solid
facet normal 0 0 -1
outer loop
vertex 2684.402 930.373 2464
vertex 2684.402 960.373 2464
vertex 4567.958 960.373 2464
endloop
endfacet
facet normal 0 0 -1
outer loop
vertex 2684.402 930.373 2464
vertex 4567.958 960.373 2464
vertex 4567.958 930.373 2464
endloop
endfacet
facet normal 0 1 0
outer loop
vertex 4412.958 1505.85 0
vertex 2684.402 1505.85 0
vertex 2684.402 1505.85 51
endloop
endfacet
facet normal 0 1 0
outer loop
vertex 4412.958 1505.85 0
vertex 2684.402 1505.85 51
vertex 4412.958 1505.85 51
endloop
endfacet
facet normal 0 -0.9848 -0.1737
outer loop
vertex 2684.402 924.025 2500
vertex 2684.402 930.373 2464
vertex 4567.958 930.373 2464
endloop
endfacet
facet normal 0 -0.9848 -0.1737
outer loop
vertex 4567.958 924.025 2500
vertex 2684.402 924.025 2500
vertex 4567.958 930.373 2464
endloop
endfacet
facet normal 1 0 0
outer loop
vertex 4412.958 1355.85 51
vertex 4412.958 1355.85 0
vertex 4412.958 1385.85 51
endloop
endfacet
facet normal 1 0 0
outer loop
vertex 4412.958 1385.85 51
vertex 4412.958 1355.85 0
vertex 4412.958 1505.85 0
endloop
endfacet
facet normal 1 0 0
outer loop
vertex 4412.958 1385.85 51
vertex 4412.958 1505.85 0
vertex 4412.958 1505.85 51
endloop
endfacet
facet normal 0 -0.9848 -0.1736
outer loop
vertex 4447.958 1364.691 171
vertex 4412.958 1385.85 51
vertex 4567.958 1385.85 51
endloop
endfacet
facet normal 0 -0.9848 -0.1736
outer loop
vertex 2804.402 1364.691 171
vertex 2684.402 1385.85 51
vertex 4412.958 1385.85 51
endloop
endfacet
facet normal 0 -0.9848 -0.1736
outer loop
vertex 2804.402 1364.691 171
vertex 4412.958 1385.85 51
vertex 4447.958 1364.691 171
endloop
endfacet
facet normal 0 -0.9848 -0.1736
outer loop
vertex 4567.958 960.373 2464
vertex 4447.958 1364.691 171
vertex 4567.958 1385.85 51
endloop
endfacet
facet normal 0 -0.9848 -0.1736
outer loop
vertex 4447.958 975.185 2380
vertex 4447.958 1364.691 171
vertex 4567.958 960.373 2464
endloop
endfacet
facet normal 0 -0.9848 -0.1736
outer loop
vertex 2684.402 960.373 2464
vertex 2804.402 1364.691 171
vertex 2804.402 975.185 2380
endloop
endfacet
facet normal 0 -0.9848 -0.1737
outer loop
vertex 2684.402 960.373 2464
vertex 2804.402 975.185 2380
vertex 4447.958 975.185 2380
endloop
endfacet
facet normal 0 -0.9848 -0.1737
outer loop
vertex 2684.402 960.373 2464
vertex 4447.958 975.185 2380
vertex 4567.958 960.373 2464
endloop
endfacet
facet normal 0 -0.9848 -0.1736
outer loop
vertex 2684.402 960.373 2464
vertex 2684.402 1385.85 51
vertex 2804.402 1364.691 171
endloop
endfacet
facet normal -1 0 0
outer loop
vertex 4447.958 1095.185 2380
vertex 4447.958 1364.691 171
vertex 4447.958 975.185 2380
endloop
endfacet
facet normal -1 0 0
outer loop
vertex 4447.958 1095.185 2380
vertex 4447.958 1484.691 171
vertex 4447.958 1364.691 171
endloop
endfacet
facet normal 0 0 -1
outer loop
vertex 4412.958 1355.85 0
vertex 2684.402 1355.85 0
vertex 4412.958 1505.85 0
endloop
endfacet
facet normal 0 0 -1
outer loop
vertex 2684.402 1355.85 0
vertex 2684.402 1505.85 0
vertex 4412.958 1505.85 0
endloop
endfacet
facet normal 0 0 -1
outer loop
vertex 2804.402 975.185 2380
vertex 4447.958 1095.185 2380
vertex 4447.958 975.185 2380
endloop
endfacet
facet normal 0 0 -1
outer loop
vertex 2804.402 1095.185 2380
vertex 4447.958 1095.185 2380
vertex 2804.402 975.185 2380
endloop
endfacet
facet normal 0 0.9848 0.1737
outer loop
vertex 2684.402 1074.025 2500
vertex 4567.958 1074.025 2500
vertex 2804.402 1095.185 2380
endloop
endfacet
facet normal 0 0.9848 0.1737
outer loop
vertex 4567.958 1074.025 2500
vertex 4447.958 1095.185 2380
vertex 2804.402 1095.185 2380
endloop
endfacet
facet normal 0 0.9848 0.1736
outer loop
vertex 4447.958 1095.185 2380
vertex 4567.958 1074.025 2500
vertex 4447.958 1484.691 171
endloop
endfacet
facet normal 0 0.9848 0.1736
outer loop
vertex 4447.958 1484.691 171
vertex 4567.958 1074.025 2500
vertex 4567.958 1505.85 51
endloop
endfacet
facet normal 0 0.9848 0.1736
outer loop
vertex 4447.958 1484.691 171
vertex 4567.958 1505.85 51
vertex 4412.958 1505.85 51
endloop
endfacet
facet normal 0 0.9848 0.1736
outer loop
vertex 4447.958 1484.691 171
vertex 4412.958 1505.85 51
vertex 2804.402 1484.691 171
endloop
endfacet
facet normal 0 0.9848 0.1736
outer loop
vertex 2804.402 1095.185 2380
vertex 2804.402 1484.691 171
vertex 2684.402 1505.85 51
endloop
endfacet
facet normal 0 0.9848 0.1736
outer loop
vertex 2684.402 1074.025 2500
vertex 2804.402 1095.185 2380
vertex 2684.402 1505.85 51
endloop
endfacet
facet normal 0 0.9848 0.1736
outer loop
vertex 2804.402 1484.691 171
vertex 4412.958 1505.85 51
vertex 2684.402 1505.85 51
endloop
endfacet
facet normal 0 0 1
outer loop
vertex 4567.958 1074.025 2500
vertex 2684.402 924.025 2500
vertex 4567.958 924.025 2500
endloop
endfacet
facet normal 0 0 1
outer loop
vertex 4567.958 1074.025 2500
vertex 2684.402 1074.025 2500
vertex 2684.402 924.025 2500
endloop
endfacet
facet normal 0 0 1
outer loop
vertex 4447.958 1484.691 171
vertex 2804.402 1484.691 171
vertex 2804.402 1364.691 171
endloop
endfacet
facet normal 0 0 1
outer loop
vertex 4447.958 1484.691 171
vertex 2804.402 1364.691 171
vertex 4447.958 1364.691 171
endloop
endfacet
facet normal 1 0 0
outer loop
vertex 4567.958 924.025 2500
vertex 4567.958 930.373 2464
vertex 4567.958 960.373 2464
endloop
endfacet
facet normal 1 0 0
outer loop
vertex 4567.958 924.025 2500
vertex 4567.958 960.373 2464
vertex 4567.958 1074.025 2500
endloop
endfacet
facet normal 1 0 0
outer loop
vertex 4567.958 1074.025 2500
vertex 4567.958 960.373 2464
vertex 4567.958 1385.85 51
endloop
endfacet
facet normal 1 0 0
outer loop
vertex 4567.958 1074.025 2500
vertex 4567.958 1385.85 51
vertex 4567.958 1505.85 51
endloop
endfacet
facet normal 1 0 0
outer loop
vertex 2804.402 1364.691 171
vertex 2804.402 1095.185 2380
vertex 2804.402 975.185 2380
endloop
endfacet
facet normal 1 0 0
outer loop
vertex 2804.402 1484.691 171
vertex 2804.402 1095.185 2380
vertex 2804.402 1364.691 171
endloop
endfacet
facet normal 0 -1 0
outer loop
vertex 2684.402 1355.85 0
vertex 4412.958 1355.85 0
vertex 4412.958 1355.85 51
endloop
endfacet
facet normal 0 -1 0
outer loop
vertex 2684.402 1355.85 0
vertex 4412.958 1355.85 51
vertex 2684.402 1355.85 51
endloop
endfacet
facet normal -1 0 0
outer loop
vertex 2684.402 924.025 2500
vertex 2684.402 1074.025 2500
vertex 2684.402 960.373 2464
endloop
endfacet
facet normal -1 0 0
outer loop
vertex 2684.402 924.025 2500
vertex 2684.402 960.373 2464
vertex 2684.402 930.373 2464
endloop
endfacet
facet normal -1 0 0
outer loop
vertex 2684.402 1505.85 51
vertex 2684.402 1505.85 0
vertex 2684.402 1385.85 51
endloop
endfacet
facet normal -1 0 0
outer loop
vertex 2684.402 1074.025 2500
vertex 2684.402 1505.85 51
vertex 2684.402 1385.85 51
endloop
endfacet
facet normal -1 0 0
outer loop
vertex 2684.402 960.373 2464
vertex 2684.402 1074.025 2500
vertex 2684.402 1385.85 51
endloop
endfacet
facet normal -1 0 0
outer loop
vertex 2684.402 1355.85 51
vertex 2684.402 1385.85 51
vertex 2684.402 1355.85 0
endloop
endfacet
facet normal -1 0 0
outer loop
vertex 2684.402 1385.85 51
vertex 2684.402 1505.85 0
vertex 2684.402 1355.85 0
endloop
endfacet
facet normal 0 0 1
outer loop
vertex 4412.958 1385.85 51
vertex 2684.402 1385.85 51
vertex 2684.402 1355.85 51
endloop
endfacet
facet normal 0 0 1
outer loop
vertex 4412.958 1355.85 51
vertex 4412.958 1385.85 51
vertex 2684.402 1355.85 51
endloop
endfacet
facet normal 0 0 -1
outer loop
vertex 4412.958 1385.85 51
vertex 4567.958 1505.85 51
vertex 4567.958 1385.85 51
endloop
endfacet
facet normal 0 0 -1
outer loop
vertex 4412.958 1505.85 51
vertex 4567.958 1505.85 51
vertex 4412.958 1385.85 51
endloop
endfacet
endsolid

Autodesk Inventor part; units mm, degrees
sketch "Sketch2" plane through (0, 0, 0) normal (0, 0, 1) x (1, 0, 0)
  line L0 (-4731.265, 1505.8501) -> (4722.9578, 1505.8501)
  line L1 (2684.4021, 1074.0253) -> (2684.4021, 1505.8501)
  line L2 (4412.9578, -1494.1499) -> (4412.9578, 1505.8501)
  line L3 (4722.9578, -1494.1499) -> (4722.9578, 1505.8501)
  line L4 (4412.9578, 1505.8501) -> (4722.9578, 1505.8501)
  line L5 (4567.9578, 1505.8501) -> (4567.9578, 1355.8501)
  line L6 (4567.9578, 1355.8501) -> (2684.4021, 1355.8501)
  point P0 (0, 0)
  dimension "d0" = 150
ref_plane "Work Plane2" through (0, 0, 2500) normal (0, 0, 1) x (1, 0, 0)
ref_plane "Work Plane1" through (0, 0, 0) normal (0, 0, 1) x (1, 0, 0)
sketch "Sketch3" plane through (0, 0, 2500) normal (0, 0, 1) x (1, 0, 0)
  line L0 (2684.4021, 1074.0253) -> (2684.4021, 1505.8501) projected
  point P0 (0, 0)
extrude "Extrusion1" add sketch "Sketch2" along normal blind 51
ref_plane "Work Plane3" through (4722.9578, 1505.8501, 51) normal (0, 0, 1) x (-1, 0, 0)
sketch "Sketch4" plane through (4722.9578, 1505.8501, 51) normal (0, 0, 1) x (-1, 0, 0)
  line L0 (155, 150) -> (155, 0) projected
  line L1 (155, 0) -> (2038.5557, 0) projected
  line L2 (2038.5557, 0) -> (2038.5557, 150) projected
  line L3 (2038.5557, 150) -> (155, 150) projected
  line L4 (2038.5557, 150) -> (155, 150) projected
  line L5 (2038.5557, 0) -> (155, 0)
  line L6 (155, 0) -> (155, 150)
  line L7 (155, 150) -> (2038.5557, 150)
  line L8 (2038.5557, 150) -> (2038.5557, 0)
  point P0 (4722.9578, 1505.8501)
ref_plane "Work Plane4" through (2684.4021, 1505.8501, 51) normal (-1, 0, 0) x (0, -1, 0)
sketch "Sketch5" plane through (2684.4021, 1505.8501, 51) normal (-1, 0, 0) x (0, -1, 0)
  line L0 (150, 0) -> (0, 0) projected
  line L1 (0, 0) -> (150, 0) projected
  line L2 (0, 0) -> (150, 0)
  line L3 (431.8248, 2449) -> (0, 2449) projected
  line L4 (431.8248, 2449) -> (581.8248, 2449)
  line L5 (0, 0) -> (431.8248, 2449)
  line L6 (0, 0) -> (2486.7798, 0) construction
  line L7 (150, 0) -> (581.8248, 2449)
  line L8 (150, 0) -> (2636.7798, 0) construction
  point P0 (1505.8501, -51)
  dimension "d5" = 80
  dimension "d6" = 80
sketch "Sketch6" plane through (0, 0, 2500) normal (0, 0, 1) x (1, 0, 0)
  line L0 (2684.4021, 1074.0253) -> (2684.4021, 924.0253) projected
  line L1 (4567.9578, 1074.0253) -> (4567.9578, 924.0253)
  line L2 (2684.4021, 1074.0253) -> (4567.9578, 1074.0253)
  line L3 (2684.4021, 924.0253) -> (4567.9578, 924.0253)
  line L4 (4567.9578, 1074.0253) -> (4567.9578, 924.0253)
  line L5 (2684.4021, 1074.0253) -> (4567.9578, 1074.0253)
  line L6 (4567.9578, 1074.0253) -> (4567.9578, 924.0253)
  line L7 (4567.9578, 924.0253) -> (2684.4021, 924.0253)
  line L8 (2684.4021, 924.0253) -> (2684.4021, 1074.0253)
  point P0 (0, 0)
loft "Loft1" add profiles "Sketch6" section 2 edges at (4567.9578, 1430.8501, 51) (3626.18, 1505.8501, 51) (2684.4021, 1430.8501, 51) (3626.18, 1355.8501, 51)
sketch "Sketch7" plane through (2684.4021, 1505.8501, 51) normal (-1, 0, 0) x (0, -1, 0)
  line L0 (0, 0) -> (150, 0) projected
  line L1 (581.8248, 2449) -> (150, 0) projected
  line L2 (431.8248, 2449) -> (581.8248, 2449) projected
  line L3 (499.9267, 2449) -> (499.9267, 2413)
  line L4 (545.477, 2413) -> (575.477, 2413)
  line L5 (150, 0) -> (120, 0)
  line L6 (120, 0) -> (545.477, 2413)
  line L7 (120, 0) -> (2570.2244, 0) construction
  line L8 (150, 0) -> (575.477, 2413)
  line L9 (545.477, 2413) -> (575.477, 2413)
  line L10 (545.477, 2413) -> (575.477, 2413)
  line L11 (150, -51) -> (0, -51) projected
  point P0 (1505.8501, -51)
  dimension "d11" = 36
  dimension "d12" = 30
  dimension "d13" = 80
extrude "Extrusion2" cut sketch "Sketch7" against normal through all
ref_plane "Work Plane5" through (4722.9578, 1505.8501, 0) normal (0, 1, 0) x (-1, 0, 0)
sketch "Sketch8" plane through (4722.9578, 1505.8501, 0) normal (0, 1, 0) x (-1, 0, 0)
  line L0 (155, 2500) -> (2038.5557, 2500) projected
  line L1 (155, 2500) -> (155, 51) projected
  line L2 (155, 51) -> (2038.5557, 51) projected
  line L3 (2038.5557, 2500) -> (2038.5557, 51) projected
  line L4 (2038.5557, 51) -> (2038.5557, 2464) projected
  line L5 (2038.5557, 51) -> (1918.5557, 51)
  line L6 (1918.5557, 51) -> (1918.5557, 171)
  line L7 (1918.5557, 171) -> (2038.5557, 171)
  line L8 (2038.5557, 171) -> (2038.5557, 51)
  line L9 (155, 2500) -> (275, 2500)
  line L10 (275, 2500) -> (275, 2380)
  line L11 (275, 2380) -> (155, 2380)
  line L12 (155, 2380) -> (155, 2500)
  line L13 (1918.5557, 171) -> (275, 171)
  line L14 (275, 171) -> (275, 2380)
  line L15 (275, 2380) -> (1918.5557, 2380)
  line L16 (1918.5557, 2380) -> (1918.5557, 171)
  point P0 (4722.9578, 0)
  dimension "d16" = 120
  dimension "d17" = 120
  dimension "d18" = 120
  dimension "d19" = 120
extrude "Extrusion3" cut sketch "Sketch8" against normal through all contours L15 L16 L13 L14
sketch "Sketch9" plane through (2684.4021, 1505.8501, 0) normal (0, 1, 0) x (1, 0, 0)
  line L0 (1883.5557, 0) -> (0, 0) projected
  line L1 (0, 0) -> (0, -51) projected
  line L2 (1883.5557, -51) -> (0, -51) projected
  line L3 (1883.5557, 0) -> (1883.5557, -51) projected
  line L4 (1883.5557, 0) -> (1728.5557, 0)
  line L5 (1728.5557, 0) -> (1728.5557, -51)
  line L6 (1728.5557, -51) -> (1883.5557, -51)
  line L7 (1883.5557, -51) -> (1883.5557, 0)
  point P0 (-2684.4021, 0)
  point P1 (1728.5557, 0)
  dimension "d22" = 155
extrude "Extrusion4" cut sketch "Sketch9" against normal through all contours L3 L2 L5 L0
properties part number "eave_frame_02" material "Wood (Maple)"
